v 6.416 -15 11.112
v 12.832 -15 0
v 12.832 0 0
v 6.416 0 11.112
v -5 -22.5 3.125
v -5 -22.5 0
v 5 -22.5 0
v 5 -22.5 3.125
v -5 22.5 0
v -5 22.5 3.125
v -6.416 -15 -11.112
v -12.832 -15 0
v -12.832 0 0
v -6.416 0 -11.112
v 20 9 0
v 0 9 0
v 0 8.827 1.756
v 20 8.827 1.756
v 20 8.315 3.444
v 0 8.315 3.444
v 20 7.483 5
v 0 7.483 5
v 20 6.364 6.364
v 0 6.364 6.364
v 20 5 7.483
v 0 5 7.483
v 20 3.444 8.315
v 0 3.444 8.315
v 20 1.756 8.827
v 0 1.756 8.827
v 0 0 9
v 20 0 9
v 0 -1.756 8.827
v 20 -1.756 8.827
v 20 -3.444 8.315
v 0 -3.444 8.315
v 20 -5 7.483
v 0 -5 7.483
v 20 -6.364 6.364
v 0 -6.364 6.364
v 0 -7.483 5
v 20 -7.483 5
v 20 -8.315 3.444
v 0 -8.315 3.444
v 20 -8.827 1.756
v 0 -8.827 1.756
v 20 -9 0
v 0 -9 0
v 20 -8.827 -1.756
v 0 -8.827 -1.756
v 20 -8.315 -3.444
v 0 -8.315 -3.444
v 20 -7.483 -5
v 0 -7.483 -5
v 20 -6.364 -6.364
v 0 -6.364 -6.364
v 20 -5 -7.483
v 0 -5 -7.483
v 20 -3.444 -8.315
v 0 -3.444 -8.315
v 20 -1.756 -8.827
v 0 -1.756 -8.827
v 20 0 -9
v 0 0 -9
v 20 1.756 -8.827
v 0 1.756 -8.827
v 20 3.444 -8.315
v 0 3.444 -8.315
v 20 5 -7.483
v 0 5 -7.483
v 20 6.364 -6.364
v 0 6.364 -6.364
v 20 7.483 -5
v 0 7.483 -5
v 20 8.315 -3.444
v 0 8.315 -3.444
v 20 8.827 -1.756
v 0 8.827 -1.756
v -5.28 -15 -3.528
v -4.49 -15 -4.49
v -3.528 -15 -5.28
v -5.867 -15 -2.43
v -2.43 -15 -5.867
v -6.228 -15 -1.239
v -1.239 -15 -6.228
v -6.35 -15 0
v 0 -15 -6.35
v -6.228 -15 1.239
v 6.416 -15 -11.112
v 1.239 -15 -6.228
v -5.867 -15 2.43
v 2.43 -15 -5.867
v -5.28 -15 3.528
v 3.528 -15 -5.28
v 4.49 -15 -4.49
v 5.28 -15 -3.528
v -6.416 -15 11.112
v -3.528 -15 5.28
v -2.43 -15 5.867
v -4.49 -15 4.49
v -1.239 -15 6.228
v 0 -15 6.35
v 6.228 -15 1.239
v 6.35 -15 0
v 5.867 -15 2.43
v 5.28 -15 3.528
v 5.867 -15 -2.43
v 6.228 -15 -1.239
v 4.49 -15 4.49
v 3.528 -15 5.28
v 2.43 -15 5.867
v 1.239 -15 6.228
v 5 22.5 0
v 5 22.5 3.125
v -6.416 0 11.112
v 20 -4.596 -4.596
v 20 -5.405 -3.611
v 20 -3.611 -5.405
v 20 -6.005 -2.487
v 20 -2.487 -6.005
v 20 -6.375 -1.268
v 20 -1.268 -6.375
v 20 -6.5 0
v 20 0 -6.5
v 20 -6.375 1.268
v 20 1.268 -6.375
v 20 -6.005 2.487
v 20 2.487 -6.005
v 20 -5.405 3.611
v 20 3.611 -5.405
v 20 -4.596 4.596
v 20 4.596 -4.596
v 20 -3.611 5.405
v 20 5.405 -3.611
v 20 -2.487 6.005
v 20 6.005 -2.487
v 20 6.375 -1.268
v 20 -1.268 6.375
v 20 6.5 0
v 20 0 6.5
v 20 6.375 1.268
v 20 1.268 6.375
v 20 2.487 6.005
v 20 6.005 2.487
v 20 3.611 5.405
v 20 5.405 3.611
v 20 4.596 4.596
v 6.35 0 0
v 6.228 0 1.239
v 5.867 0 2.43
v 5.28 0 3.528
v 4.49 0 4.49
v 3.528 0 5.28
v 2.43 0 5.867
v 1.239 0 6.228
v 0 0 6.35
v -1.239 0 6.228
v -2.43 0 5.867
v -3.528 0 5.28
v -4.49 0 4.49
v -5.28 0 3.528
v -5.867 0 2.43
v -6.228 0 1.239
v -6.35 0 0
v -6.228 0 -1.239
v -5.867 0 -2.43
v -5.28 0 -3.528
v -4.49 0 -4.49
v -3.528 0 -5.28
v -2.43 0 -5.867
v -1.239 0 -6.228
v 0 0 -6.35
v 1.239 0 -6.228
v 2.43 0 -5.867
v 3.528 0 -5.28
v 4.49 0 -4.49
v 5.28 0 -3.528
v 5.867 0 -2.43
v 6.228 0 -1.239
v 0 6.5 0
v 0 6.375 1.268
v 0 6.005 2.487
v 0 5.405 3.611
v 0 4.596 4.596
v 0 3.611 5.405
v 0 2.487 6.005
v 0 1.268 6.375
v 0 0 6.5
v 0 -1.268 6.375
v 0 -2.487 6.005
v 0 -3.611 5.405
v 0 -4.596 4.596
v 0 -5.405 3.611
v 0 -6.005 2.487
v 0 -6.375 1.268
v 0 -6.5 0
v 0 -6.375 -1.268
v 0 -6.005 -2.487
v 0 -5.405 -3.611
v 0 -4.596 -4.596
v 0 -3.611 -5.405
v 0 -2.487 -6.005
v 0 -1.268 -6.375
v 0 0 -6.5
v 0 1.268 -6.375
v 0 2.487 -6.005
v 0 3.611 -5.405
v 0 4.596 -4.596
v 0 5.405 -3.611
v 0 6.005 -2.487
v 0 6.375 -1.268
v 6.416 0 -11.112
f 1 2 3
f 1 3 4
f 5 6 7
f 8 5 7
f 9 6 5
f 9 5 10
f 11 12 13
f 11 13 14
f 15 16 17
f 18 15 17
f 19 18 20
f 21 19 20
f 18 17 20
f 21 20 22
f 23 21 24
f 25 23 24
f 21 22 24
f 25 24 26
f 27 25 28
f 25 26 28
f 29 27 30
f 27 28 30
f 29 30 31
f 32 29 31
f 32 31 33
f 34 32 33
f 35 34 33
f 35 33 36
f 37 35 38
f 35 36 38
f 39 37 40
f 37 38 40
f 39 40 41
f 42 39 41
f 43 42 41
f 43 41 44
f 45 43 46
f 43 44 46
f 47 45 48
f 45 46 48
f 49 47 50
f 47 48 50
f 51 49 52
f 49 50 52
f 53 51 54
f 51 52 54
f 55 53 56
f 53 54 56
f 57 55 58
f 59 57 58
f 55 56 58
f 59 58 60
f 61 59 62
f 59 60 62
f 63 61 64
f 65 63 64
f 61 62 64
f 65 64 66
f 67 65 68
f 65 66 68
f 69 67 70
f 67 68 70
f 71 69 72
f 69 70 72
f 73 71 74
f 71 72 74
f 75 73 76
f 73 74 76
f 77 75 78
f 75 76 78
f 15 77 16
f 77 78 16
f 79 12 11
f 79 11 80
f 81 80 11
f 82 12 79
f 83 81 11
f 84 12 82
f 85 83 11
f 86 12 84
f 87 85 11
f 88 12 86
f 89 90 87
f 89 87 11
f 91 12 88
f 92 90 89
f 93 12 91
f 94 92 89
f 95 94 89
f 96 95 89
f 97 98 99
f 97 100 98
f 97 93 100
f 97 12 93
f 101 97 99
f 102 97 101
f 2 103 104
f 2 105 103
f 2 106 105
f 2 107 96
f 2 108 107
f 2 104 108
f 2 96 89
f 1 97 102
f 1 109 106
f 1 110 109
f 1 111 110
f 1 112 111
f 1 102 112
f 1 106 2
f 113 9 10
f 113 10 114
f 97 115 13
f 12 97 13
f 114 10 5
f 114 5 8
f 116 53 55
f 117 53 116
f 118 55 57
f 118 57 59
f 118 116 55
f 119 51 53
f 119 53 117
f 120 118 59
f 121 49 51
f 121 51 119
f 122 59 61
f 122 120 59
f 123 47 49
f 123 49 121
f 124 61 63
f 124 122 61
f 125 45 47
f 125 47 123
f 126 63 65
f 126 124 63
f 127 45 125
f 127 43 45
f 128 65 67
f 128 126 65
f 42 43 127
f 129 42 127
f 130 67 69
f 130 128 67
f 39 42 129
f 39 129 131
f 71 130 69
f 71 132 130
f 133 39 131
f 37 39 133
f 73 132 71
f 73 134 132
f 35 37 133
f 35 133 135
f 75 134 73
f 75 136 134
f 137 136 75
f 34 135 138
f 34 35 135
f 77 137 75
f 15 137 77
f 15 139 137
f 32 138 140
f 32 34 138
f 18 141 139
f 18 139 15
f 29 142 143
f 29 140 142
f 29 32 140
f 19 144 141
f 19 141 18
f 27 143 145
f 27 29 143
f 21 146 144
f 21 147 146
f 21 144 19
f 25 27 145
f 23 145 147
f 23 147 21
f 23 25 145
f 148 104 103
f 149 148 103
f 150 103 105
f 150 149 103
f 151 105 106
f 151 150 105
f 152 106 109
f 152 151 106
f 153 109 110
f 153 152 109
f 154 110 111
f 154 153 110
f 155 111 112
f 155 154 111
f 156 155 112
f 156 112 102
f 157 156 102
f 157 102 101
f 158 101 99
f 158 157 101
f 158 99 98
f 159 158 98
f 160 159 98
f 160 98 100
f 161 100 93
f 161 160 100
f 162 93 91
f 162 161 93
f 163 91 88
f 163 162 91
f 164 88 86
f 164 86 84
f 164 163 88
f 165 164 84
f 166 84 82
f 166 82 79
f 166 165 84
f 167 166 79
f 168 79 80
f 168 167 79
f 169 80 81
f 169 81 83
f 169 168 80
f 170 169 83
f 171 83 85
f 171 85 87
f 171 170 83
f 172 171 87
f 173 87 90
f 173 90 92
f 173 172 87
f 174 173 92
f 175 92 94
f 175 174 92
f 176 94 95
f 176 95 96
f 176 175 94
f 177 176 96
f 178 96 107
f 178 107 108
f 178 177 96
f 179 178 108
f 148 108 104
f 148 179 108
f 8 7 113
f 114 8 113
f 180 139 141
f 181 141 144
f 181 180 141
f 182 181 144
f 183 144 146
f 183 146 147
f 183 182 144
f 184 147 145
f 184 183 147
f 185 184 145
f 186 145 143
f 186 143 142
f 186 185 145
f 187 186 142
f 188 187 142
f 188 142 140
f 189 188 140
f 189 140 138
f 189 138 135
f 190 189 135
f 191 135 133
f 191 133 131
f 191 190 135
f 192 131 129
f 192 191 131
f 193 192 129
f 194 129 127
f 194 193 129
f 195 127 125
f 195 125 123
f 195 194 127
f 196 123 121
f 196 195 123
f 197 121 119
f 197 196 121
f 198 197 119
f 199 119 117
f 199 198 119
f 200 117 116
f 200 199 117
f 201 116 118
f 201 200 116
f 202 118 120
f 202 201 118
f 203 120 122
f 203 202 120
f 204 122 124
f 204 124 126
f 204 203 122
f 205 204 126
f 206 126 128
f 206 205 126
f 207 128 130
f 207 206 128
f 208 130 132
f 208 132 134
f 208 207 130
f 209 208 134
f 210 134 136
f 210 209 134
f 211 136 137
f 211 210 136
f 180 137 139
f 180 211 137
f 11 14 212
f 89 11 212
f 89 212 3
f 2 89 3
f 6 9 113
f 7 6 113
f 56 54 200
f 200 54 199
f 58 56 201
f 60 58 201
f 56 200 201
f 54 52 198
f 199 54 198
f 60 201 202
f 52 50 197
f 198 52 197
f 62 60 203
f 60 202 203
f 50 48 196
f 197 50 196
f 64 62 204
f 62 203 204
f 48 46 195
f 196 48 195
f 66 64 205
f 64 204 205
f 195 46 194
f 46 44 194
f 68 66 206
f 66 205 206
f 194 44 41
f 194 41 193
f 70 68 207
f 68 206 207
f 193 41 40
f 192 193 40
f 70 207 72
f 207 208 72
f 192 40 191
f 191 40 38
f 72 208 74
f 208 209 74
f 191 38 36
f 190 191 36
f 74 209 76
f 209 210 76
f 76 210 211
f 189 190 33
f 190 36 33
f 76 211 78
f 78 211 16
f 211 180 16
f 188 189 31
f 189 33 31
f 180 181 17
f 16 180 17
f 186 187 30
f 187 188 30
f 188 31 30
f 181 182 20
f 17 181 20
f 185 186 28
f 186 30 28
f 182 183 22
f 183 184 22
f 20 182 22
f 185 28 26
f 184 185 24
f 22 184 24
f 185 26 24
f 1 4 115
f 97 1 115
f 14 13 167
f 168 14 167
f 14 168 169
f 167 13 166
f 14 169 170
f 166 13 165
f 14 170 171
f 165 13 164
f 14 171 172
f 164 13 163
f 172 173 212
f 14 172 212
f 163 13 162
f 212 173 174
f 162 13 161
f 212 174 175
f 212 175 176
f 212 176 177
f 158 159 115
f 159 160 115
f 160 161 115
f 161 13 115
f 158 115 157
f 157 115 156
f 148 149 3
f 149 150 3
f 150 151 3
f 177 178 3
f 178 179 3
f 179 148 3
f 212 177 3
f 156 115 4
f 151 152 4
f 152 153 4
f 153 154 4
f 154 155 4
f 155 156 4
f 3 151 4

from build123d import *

# Parameters (mm, degrees)
F0_R     = 6.35
F1_DEPTH = 15
F2_R     = 9
F2_R_2   = 6.5
F3_DEPTH = 20
F4_W     = 10
F4_H     = 45
F5_DEPTH = 3.125


with BuildPart() as f1:
    # F0 (on Front) → F1 (new body)
    with BuildSketch(Plane.XZ):
        Polygon((6.415805, 11.1125), (-6.415805, 11.1125), (-12.83161, 0), (-6.415805, -11.1125), (6.415805, -11.1125), (12.83161, 0), align=None)
        Circle(F0_R, mode=Mode.SUBTRACT)
    extrude(amount=F1_DEPTH)


with BuildPart() as f3:
    # F2 (on Right) → F3 (new body)
    with BuildSketch(Plane.YZ):
        Circle(F2_R)
        Circle(F2_R_2, mode=Mode.SUBTRACT)
    extrude(amount=F3_DEPTH)


with BuildPart() as f5:
    # F4 (on Top) → F5 (new body)
    with BuildSketch(Plane.XY):
        Rectangle(F4_W, F4_H)
    extrude(amount=F5_DEPTH)


solid = Compound([f1.part, f3.part, f5.part])
